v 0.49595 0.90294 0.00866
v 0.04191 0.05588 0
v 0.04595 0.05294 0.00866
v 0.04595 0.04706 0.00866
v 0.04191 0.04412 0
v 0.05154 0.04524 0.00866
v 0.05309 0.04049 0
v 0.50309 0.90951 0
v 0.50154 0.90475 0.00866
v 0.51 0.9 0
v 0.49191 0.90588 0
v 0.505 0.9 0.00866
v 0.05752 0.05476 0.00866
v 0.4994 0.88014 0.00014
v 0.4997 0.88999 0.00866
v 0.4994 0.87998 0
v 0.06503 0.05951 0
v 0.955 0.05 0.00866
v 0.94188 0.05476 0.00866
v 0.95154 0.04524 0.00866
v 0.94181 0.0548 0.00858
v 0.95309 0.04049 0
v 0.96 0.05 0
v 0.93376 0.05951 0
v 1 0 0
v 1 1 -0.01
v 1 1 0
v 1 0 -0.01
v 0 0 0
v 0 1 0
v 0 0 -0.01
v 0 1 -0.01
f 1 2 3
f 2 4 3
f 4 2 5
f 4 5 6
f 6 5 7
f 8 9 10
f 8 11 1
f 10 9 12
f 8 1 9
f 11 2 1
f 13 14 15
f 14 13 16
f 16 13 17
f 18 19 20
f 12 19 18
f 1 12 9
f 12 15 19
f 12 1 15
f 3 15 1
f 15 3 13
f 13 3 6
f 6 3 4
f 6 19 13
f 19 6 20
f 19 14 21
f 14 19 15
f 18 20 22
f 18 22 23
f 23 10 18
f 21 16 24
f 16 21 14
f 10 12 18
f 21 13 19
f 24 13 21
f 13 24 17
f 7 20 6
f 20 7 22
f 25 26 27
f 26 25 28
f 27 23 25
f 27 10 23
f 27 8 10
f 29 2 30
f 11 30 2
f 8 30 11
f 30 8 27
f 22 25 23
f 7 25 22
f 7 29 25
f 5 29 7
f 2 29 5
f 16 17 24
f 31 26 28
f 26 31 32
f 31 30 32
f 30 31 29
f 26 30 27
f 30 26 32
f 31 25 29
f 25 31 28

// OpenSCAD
hull(){
    translate([0.05, 0.05]) sphere(0.01);
    translate([0.5, 0.9]) sphere(0.01);
}
hull(){
    translate([0.5, 0.9]) sphere(0.01);
    translate([0.95, 0.05]) sphere(0.01);
}
hull(){
    translate([0.95, 0.05]) sphere(0.01);
    translate([0.05, 0.05]) sphere(0.01);
}
translate([0,0,-0.01]) color([0.1,0.1,0.1]) cube([1,1,0.01]);
